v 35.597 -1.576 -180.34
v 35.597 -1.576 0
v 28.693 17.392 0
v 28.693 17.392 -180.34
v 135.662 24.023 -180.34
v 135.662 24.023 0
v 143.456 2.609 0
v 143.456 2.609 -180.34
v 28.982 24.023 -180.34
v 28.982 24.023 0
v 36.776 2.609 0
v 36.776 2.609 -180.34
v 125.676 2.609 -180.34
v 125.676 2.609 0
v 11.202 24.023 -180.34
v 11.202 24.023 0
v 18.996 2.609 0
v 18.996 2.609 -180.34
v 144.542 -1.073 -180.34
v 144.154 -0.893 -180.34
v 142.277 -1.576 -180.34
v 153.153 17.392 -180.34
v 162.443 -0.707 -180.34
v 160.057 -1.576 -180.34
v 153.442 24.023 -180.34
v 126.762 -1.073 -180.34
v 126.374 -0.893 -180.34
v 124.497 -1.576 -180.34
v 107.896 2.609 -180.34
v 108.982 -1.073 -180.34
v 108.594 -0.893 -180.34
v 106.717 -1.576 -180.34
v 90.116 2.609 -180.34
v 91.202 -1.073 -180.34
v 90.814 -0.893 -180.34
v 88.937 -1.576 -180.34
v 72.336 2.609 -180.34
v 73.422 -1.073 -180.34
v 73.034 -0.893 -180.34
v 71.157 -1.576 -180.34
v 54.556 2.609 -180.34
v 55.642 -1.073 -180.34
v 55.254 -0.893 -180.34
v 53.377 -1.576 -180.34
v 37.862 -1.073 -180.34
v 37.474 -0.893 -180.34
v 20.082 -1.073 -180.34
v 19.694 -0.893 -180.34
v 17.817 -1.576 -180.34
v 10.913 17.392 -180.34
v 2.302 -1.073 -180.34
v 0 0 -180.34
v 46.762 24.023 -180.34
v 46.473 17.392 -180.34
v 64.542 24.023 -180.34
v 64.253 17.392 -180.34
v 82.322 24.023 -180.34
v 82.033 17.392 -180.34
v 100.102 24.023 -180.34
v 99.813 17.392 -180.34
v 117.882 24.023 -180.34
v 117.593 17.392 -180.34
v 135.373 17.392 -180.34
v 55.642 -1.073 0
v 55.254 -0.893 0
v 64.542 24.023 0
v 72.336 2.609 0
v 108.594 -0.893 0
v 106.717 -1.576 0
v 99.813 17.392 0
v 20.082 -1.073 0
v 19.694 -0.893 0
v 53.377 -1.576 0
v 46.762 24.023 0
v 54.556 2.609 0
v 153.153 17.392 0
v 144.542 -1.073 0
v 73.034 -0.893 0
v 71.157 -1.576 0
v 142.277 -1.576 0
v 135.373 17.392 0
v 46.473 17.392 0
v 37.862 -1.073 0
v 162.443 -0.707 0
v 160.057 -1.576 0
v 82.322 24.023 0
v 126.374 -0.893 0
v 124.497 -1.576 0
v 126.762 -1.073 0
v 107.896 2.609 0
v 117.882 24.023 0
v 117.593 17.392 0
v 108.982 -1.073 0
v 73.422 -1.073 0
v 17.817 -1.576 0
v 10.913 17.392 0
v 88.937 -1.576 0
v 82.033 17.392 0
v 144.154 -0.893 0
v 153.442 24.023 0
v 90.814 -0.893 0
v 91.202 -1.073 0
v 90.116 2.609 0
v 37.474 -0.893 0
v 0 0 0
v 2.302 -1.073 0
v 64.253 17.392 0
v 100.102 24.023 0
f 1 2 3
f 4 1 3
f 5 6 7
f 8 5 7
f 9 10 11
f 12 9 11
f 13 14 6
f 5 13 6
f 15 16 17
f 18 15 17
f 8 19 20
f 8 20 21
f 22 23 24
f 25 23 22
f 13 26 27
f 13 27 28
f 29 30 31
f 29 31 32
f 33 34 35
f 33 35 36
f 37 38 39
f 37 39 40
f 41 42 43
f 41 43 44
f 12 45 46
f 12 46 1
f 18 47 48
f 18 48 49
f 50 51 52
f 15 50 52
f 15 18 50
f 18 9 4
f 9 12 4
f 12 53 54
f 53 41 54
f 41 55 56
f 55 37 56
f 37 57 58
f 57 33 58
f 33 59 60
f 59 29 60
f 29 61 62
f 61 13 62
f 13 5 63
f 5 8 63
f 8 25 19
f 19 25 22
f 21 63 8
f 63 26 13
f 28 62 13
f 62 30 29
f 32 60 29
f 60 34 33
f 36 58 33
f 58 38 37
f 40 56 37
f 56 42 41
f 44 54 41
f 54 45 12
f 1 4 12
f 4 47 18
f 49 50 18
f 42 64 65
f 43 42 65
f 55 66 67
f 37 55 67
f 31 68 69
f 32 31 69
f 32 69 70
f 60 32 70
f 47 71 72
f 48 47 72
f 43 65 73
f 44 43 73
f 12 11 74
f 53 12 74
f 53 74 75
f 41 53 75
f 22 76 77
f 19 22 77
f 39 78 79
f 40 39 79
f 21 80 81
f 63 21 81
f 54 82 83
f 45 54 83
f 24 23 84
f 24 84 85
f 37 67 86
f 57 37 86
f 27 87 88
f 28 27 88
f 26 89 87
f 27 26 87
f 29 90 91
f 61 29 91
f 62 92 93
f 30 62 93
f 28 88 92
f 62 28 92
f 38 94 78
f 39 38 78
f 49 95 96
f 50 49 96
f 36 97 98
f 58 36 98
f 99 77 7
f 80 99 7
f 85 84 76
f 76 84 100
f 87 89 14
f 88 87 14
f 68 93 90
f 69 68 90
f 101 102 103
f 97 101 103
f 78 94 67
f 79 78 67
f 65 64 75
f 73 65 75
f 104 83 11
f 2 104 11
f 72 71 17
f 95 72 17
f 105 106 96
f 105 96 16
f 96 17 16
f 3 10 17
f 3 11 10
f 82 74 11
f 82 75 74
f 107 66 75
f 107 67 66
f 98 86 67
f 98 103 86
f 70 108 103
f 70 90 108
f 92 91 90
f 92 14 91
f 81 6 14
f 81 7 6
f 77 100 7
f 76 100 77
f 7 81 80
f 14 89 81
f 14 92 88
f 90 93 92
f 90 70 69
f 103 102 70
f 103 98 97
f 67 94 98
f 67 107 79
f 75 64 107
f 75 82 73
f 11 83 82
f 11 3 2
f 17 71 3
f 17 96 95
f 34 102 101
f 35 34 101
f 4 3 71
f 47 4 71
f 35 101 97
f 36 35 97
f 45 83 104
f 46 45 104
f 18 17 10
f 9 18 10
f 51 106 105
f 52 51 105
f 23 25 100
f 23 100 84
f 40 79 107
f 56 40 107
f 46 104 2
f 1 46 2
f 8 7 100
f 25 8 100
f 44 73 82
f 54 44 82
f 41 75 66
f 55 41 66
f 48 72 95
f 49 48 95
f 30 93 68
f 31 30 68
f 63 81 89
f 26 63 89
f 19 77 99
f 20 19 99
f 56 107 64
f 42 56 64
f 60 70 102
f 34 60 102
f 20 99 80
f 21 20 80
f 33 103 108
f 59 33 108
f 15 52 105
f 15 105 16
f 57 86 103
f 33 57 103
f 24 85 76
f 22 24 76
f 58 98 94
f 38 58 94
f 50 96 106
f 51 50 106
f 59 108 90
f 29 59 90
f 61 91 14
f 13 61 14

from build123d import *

# Parameters (mm, degrees)
EXTRUDE_THIN1_DEPTH  = 180.34
LPATTERN1_COUNT      = 2
LPATTERN1_PITCH      = 20.32
LPATTERN1_COUNT_DIR2 = 9
LPATTERN1_PITCH_DIR2 = 17.78


with BuildPart() as part:
    # Sketch1 → Extrude-Thin1 (new body)
    with BuildSketch(Plane.XY):
        Polygon((0, 0), (11.202174456, 24.023140647), (20.203364855, -0.707426722), (17.816545598, -1.576157886), (10.912657758, 17.392118062), (2.302021779, -1.073450385), align=None)
    extrude_thin1 = extrude(amount=-EXTRUDE_THIN1_DEPTH)

    # LPattern1: Extrude-Thin1 2 × 9, 9 skipped
    with Locations(*[(j * LPATTERN1_PITCH_DIR2, i * LPATTERN1_PITCH, 0) for i in range(LPATTERN1_COUNT) for j in range(LPATTERN1_COUNT_DIR2) if (i, j) not in ((0, 0), (1, 0), (1, 1), (1, 2), (1, 3), (1, 4), (1, 5), (1, 6), (1, 7), (1, 8))]):
        add(extrude_thin1)


solid = part.part
